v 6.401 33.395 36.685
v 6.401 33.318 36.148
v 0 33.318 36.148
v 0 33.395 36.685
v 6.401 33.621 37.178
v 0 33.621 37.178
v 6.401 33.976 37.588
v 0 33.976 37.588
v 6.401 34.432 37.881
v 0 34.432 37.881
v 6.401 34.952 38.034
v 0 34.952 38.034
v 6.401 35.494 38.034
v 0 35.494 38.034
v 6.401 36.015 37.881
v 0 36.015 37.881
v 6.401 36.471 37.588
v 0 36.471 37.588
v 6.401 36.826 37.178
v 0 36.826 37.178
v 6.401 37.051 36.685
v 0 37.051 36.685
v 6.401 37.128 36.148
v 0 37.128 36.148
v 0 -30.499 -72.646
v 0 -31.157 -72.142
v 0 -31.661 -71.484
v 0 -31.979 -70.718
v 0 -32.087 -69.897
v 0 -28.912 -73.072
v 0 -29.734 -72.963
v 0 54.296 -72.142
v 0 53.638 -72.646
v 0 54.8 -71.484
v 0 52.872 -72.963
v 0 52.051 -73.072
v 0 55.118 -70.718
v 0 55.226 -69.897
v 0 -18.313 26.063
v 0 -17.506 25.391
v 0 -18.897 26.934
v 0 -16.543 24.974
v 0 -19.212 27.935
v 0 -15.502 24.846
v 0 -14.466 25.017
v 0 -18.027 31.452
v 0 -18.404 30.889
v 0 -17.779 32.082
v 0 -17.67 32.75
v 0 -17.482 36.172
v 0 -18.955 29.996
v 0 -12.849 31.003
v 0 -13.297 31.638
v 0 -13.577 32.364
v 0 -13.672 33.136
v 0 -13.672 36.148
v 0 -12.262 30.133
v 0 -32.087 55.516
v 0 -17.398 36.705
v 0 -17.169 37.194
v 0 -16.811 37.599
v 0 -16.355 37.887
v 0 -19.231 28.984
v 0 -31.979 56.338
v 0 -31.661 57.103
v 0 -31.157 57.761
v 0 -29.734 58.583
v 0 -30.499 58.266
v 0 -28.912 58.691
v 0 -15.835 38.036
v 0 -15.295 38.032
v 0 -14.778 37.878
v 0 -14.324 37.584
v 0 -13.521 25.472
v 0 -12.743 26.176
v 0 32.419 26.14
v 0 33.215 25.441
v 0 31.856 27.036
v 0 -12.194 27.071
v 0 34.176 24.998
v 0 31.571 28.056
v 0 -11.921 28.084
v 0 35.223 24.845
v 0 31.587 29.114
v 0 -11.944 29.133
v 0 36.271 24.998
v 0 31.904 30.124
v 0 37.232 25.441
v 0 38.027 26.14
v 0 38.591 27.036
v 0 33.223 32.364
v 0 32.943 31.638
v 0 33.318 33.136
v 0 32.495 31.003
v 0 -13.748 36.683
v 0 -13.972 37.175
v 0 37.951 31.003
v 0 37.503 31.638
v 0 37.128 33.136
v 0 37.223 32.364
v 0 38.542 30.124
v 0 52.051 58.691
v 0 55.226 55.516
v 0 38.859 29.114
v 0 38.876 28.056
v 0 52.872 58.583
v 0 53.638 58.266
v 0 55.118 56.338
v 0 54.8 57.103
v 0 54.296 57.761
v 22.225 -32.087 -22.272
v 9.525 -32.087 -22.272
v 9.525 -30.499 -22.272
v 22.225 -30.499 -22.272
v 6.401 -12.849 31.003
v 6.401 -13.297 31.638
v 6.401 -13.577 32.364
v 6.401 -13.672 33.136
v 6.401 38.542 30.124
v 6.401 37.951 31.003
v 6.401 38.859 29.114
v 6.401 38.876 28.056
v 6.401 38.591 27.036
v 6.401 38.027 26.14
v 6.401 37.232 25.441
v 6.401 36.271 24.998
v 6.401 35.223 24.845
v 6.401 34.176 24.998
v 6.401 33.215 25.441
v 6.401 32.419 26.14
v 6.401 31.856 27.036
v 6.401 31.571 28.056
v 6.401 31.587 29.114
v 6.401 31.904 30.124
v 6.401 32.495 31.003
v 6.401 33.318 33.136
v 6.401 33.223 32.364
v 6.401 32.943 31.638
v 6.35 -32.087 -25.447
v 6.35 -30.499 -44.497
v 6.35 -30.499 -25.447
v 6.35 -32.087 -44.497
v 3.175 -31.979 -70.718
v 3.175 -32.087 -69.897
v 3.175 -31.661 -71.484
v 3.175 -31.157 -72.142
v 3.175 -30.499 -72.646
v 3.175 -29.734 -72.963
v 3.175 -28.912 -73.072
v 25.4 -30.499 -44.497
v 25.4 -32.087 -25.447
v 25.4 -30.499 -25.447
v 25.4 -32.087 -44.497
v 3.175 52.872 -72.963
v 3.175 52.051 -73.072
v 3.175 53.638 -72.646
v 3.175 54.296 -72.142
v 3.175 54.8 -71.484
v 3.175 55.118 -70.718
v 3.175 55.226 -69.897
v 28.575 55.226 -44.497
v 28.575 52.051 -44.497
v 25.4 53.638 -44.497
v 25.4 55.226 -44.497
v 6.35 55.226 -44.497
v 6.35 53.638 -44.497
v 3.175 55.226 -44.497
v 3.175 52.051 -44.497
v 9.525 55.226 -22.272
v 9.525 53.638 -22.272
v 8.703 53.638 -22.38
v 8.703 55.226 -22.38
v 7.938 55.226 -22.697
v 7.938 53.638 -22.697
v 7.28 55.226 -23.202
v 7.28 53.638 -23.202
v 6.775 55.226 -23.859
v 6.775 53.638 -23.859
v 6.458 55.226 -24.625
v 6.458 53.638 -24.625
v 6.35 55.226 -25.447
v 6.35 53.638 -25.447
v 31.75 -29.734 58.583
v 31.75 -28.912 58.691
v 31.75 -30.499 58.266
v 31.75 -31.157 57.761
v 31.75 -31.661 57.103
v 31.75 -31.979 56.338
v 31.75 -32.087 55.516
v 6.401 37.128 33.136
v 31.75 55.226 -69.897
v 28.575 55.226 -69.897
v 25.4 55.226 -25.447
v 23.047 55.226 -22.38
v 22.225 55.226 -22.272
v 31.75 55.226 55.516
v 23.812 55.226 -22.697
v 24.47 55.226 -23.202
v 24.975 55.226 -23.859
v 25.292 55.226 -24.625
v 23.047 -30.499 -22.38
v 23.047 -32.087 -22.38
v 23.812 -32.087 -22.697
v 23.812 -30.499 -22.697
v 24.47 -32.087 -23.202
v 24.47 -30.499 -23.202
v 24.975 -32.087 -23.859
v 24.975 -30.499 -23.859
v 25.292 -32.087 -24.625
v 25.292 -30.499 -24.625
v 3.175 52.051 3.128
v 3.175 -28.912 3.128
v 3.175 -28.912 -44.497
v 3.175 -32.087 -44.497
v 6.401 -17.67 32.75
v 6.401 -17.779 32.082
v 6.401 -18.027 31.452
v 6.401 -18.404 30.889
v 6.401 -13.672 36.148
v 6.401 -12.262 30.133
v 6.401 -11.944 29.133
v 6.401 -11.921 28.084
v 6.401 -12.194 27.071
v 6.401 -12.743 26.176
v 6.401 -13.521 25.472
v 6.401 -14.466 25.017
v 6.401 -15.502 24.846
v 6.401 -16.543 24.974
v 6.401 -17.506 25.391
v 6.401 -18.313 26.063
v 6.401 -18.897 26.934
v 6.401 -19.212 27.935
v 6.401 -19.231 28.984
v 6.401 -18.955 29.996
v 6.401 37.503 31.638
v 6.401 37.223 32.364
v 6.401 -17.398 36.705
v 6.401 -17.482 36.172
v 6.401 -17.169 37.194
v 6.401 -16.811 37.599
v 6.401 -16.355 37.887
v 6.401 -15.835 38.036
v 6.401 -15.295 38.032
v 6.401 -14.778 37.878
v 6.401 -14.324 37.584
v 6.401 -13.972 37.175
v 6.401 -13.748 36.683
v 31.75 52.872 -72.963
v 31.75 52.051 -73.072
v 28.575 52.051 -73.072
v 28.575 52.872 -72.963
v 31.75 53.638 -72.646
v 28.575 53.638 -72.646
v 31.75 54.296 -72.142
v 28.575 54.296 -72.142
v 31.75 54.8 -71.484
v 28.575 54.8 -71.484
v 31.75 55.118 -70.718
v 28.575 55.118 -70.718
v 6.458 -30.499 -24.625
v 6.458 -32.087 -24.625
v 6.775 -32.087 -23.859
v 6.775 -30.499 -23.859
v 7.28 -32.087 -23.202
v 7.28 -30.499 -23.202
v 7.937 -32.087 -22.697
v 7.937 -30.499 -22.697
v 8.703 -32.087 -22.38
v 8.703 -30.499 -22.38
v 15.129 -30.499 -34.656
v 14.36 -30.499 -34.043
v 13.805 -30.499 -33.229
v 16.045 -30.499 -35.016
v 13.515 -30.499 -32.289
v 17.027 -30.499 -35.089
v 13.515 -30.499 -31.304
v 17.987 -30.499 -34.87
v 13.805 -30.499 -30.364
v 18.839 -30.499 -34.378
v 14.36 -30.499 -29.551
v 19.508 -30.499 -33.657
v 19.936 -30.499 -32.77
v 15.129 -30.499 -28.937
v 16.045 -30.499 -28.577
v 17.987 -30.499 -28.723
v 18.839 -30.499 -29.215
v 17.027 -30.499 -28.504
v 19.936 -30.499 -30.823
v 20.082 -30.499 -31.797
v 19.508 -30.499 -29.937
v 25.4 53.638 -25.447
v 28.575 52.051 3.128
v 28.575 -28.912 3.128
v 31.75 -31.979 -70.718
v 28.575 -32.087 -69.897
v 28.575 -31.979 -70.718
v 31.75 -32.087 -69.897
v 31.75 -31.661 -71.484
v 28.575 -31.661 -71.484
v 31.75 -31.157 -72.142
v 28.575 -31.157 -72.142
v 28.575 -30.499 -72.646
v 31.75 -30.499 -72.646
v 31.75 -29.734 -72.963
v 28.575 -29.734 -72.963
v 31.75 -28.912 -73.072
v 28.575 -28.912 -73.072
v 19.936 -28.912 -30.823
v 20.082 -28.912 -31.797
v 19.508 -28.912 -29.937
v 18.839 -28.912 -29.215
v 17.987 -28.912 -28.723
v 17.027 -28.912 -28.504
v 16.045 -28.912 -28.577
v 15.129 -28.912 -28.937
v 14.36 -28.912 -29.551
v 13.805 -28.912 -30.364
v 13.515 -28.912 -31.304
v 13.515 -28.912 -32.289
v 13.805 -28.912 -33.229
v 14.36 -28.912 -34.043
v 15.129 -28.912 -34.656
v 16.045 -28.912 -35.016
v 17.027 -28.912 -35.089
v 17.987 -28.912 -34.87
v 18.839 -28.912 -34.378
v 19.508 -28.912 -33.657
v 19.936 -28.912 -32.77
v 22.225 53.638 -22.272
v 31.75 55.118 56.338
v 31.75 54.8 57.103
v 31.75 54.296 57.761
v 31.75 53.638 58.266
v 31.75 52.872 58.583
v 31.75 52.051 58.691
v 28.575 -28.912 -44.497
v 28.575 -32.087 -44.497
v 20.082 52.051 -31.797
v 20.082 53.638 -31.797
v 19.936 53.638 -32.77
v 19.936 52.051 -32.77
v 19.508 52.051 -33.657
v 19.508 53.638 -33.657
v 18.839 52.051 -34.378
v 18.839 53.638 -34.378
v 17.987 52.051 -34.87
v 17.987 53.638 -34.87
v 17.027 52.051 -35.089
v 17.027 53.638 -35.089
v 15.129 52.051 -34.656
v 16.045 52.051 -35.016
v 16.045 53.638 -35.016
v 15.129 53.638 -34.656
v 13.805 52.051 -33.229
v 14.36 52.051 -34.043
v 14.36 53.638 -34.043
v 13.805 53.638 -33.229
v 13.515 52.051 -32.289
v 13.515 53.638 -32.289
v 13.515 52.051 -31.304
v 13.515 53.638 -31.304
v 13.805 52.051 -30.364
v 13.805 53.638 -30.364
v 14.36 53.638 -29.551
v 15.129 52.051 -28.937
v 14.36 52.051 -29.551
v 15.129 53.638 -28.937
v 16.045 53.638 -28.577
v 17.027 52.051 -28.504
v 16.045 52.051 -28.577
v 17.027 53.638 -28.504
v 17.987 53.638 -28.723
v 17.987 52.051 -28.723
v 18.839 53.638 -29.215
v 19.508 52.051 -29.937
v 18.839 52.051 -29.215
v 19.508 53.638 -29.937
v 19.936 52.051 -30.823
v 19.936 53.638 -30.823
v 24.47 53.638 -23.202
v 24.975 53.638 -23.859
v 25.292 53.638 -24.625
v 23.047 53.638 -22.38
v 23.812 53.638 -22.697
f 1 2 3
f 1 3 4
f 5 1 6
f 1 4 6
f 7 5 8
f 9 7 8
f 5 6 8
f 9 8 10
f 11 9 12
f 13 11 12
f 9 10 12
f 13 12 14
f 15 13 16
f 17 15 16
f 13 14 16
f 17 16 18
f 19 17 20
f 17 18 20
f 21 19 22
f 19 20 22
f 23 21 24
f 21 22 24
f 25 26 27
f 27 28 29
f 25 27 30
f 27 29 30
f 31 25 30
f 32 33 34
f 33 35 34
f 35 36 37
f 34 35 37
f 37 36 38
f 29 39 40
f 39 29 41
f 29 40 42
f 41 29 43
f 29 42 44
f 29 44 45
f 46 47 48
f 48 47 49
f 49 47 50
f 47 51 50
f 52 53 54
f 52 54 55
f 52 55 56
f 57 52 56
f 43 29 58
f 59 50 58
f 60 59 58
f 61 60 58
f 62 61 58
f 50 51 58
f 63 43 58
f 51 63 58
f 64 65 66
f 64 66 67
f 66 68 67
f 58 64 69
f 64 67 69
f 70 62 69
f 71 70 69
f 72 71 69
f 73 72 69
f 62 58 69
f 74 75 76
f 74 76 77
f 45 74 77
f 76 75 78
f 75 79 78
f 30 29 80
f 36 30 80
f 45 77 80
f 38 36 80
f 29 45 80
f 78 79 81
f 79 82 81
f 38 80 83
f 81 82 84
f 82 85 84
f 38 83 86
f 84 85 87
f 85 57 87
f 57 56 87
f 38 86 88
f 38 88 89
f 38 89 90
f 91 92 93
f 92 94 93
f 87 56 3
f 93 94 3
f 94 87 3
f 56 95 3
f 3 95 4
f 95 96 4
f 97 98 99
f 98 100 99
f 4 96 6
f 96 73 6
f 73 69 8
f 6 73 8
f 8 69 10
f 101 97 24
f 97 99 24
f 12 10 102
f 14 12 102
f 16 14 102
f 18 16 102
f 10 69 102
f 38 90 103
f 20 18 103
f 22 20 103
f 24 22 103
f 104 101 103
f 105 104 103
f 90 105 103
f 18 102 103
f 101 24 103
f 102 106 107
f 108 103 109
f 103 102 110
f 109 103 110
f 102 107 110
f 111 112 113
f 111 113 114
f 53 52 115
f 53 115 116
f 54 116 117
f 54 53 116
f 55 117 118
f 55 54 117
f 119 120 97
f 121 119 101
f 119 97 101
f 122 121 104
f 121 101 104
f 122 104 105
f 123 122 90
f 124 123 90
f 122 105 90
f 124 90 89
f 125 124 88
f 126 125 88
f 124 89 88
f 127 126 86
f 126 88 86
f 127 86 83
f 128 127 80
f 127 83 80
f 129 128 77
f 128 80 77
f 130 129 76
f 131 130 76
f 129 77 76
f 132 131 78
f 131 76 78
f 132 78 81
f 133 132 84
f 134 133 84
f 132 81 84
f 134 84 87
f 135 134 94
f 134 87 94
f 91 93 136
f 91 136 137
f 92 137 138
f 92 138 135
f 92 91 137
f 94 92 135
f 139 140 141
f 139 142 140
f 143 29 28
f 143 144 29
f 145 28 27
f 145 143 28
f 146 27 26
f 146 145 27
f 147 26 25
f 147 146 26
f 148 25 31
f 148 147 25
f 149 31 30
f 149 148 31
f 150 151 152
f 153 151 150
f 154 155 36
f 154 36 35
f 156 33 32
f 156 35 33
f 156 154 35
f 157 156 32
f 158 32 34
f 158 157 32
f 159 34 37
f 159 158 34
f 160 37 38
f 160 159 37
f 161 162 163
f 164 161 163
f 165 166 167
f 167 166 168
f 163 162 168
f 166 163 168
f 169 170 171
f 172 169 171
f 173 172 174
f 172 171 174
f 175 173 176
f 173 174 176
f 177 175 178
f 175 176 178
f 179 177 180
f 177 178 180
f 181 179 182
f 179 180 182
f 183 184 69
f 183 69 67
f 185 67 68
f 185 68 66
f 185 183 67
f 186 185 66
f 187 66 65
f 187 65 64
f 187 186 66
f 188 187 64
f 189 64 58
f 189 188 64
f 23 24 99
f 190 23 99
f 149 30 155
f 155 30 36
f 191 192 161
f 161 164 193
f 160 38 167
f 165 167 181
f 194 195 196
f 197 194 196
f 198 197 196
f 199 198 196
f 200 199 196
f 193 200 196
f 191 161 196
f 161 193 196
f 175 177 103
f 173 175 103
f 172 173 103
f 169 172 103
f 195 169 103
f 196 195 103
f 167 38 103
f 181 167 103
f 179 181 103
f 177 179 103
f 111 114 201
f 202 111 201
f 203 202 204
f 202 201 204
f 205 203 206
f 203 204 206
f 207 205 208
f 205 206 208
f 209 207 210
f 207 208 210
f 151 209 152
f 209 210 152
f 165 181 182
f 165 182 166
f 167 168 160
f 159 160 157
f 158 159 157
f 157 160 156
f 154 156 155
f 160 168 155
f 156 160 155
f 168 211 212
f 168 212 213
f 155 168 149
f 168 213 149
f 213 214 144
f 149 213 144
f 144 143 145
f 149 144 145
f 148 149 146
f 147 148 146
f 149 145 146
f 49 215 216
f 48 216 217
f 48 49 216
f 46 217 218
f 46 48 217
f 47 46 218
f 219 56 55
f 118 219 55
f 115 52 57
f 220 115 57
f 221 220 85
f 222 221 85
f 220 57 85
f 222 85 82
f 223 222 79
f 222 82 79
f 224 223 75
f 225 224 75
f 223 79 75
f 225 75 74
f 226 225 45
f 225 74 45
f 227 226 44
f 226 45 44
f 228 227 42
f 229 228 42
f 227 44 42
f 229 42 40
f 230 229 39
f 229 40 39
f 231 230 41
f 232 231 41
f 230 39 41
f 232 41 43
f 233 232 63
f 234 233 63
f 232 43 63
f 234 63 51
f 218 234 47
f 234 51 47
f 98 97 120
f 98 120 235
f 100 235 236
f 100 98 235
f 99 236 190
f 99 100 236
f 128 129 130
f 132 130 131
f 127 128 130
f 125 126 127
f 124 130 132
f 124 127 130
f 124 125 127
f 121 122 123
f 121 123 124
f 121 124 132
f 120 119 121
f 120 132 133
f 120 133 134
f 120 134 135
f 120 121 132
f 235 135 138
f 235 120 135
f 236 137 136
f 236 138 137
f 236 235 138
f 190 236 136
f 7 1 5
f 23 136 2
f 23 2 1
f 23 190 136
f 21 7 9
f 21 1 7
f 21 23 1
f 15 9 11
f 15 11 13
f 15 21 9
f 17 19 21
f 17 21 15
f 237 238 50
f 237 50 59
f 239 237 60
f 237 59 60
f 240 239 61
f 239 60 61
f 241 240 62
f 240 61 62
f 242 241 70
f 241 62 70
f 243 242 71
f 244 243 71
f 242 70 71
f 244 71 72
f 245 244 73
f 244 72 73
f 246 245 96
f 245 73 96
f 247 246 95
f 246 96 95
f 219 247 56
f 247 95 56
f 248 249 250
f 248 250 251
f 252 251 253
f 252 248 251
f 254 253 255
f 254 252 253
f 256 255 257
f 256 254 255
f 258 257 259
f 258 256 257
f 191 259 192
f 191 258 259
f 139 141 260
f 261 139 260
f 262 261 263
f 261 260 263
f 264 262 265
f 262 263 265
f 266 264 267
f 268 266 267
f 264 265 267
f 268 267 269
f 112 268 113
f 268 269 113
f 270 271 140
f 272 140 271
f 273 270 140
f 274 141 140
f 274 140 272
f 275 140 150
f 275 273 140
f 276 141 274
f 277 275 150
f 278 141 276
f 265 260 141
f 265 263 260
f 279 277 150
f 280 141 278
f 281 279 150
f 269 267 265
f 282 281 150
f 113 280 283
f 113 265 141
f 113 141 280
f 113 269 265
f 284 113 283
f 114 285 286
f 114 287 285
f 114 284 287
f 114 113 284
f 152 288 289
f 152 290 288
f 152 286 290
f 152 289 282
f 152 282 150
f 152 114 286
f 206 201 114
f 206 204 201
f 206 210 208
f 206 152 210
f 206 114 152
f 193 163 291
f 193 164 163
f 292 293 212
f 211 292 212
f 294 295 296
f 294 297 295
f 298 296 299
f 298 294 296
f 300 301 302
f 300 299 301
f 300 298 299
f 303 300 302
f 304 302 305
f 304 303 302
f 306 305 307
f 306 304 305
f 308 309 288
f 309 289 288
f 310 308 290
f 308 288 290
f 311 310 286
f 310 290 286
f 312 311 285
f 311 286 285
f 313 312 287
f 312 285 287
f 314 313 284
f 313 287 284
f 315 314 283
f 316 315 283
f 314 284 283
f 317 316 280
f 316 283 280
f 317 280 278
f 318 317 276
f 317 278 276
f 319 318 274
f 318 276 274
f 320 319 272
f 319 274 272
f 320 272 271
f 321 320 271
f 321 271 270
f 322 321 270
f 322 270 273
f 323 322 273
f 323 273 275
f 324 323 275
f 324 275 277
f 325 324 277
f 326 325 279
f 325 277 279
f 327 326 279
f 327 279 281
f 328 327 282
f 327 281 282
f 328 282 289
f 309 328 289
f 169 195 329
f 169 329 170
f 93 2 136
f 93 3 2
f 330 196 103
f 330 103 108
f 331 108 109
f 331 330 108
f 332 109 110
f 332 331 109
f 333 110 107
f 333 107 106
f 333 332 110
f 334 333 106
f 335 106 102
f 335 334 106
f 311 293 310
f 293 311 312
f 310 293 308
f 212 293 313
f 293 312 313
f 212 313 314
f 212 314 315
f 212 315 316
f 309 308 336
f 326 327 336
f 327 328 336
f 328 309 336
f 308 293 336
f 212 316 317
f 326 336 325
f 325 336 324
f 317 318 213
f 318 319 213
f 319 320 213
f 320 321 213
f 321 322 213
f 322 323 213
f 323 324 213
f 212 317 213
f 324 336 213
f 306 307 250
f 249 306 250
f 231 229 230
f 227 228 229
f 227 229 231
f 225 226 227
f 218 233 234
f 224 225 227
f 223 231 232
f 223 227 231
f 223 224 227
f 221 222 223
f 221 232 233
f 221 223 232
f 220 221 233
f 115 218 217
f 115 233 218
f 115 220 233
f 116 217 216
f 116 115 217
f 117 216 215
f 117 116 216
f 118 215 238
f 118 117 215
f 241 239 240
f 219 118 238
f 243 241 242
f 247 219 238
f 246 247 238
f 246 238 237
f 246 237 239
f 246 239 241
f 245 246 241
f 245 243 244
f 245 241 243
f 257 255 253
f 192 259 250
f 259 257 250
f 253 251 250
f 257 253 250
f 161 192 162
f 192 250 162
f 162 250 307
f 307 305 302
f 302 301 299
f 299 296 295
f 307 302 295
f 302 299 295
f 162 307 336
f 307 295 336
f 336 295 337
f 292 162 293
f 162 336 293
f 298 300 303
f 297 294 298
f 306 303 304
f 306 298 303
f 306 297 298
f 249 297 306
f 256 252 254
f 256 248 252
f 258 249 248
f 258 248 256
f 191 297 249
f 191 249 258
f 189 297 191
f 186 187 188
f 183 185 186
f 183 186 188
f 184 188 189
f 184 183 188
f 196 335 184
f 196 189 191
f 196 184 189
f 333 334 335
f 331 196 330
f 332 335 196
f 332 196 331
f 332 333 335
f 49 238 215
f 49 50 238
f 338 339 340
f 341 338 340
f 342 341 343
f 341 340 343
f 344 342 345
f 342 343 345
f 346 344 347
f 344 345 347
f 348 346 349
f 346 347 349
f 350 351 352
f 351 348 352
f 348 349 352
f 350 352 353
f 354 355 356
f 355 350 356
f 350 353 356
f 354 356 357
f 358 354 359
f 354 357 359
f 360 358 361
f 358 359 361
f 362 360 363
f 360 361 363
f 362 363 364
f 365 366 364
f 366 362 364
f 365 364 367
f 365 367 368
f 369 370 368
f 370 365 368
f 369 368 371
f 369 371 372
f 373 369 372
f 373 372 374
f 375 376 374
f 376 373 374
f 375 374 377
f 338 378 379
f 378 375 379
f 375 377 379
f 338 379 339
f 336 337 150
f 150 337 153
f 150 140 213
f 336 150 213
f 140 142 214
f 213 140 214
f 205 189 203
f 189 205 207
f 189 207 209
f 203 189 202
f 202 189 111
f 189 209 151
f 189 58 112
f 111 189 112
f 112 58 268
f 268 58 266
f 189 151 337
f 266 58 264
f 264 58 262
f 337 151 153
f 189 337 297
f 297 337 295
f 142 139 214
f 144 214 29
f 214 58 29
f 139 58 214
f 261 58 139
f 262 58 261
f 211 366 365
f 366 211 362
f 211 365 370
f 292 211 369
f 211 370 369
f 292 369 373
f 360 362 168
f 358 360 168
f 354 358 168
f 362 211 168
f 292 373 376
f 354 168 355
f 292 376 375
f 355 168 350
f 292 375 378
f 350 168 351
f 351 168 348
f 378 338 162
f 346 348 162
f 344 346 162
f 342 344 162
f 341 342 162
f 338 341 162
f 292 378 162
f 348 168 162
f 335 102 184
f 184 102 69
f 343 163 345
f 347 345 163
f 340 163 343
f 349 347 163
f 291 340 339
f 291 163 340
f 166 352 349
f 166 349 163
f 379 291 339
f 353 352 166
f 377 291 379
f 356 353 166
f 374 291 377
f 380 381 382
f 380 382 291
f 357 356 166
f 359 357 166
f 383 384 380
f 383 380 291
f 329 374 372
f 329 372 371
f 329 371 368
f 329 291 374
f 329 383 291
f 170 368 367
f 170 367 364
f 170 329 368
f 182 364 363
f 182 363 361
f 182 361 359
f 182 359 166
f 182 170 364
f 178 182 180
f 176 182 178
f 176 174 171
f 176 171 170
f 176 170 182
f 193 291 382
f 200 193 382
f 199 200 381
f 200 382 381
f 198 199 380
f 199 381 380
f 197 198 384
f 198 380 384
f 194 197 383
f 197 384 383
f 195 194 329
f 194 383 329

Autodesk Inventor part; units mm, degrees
ref_plane "YZ Plane" through (0, 0, 0) normal (1, 0, 0) x (0, 1, 0)
ref_plane "XZ Plane" through (0, 0, 0) normal (0, 1, 0) x (-1, 0, 0)
ref_plane "XY Plane" through (0, 0, 0) normal (0, 0, 1) x (1, 0, 0)
sketch "Sketch1" plane through (0, 0, 0) normal (1, 0, 0) x (0, 1, 0)
  line L0 (55.2257, 58.6909) -> (-32.0868, 58.6909)
  line L1 (-32.0868, 58.6909) -> (-32.0868, -73.0716)
  line L2 (-32.0868, -73.0716) -> (55.2257, -73.0716)
  line L3 (55.2257, -73.0716) -> (55.2257, 58.6909)
  point P0 (0, 0)
  dimension "d0" = 131.7625
  dimension "d1" = 87.3125
extrude "Extrusion1" add sketch "Sketch1" along normal blind 31.75
sketch "Sketch2" plane through (0, -32.0868, -73.0716) normal (0, -1, 0) x (1, 0, 0)
  line L0 (31.75, 131.7625) -> (31.75, 0) projected
  line L1 (0, 131.7625) -> (0, 0) projected
  line L2 (28.575, 28.575) -> (3.175, 28.575)
  line L3 (3.175, 28.575) -> (3.175, 0)
  line L4 (3.175, 0) -> (28.575, 0)
  line L5 (28.575, 0) -> (28.575, 28.575)
  point P0 (0, 73.0716)
  point P1 (31.75, 28.575)
  dimension "d7" = 3.175
  dimension "d8" = 3.175
  dimension "d9" = 28.575
extrude "Extrusion2" cut sketch "Sketch2" against normal blind 87.3125
sketch "Sketch3" plane through (28.575, -32.0868, -44.4966) normal (0, 0, -1) x (-1, 0, 0)
  line L0 (0, 0) -> (0, 87.3125) projected
  line L1 (25.4, 0) -> (25.4, 87.3125) projected
  line L2 (0, 3.175) -> (25.4, 3.175)
  line L3 (25.4, 3.175) -> (25.4, 84.1375)
  line L4 (25.4, 84.1375) -> (0, 84.1375)
  line L5 (0, 84.1375) -> (0, 3.175)
  line L6 (0, 87.3125) -> (25.4, 87.3125) projected
  line L7 (25.4, 0) -> (0, 0) projected
  point P0 (28.575, 32.0868)
  point P1 (12.7, 84.1375)
  point P2 (12.7, 3.175)
  point P3 (0, 84.1375)
  point P4 (25.4, 3.175)
  dimension "d10" = 3.175
  dimension "d11" = 3.175
extrude "Extrusion3" cut sketch "Sketch3" against normal blind 47.625 contours L0 L4 L1 L2
sketch "Sketch4" plane through (0, -32.0868, -73.0716) normal (0, -1, 0) x (1, 0, 0)
  line L0 (3.175, 28.575) -> (28.575, 28.575) projected
  line L1 (25.4, 28.575) -> (6.35, 28.575)
  line L2 (6.35, 28.575) -> (6.35, 50.8)
  line L3 (6.35, 50.8) -> (25.4, 50.8)
  line L4 (25.4, 50.8) -> (25.4, 28.575)
  line L5 (31.75, 131.7625) -> (31.75, 0) projected
  circle A0 centre (16.7802, 41.275) radius 3.302
  point P0 (0, 73.0716)
  point P1 (15.875, 50.8)
  point P2 (15.875, 28.575)
  point P3 (25.4, 39.6875)
  point P4 (6.35, 28.575)
  dimension "d14" = 22.225
  dimension "d15" = 19.05
  dimension "d16" = 6.35
  dimension "d17" = 6.604
  dimension "d18" = 12.7
extrude "Extrusion4" cut sketch "Sketch4" against normal blind 1.5875
sketch "Sketch6" plane through (0, -30.4993, -73.0716) normal (0, -1, 0) x (1, 0, 0)
  circle A0 centre (16.7802, 41.275) radius 3.302 projected
  circle A1 centre (16.7802, 41.275) radius 3.302
  point P0 (0, 73.0716)
extrude "Extrusion5" cut sketch "Sketch6" along normal mid plane 3.175
ref_plane "Work Plane2" through (0, 11.5695, -73.0716) normal (0, -1, 0) x (1, 0, 0)
mirror "Mirror1" about plane through (0, 11.5695, -73.0716) normal (0, -1, 0) of "Extrusion4"
mirror "Mirror2" about plane through (0, 11.5695, -73.0716) normal (0, -1, 0) of "Extrusion5"
fillet "Fillet1" radius 3.175 4 edges at (30.1625, -32.0868, -73.0716) (1.5875, -32.0868, -73.0716) (30.1625, 55.2257, -73.0716) (1.5875, 55.2257, -73.0716)
fillet "Fillet2" radius 3.175 2 edges at (15.875, -32.0868, 58.6909) (15.875, 55.2257, 58.6909)
fillet "Fillet3" radius 3.175 4 edges at (6.35, -31.293, -22.2716) (25.4, -31.293, -22.2716) (25.4, 54.432, -22.2716) (6.35, 54.432, -22.2716)
sketch "Sketch8" plane through (0, 0, 0) normal (-1, 0, 0) x (0, 0, 1)
  line L0 (-69.8966, 55.2257) -> (55.5159, 55.2257) projected
  line L1 (-73.0716, -28.9118) -> (-73.0716, 52.0507) projected
  arc A0 (31.0026, -12.8486) -> (30.8894, -18.4035) centre (28.5284, -15.5768) ccw
  arc A1 (36.1718, -17.4816) -> (36.1484, -13.6718) centre (36.1484, -15.5768) ccw
  line L2 (36.1484, -13.6718) -> (33.1356, -13.6718)
  line L3 (36.1718, -17.4816) -> (32.75, -17.6702)
  arc A2 (31.0026, -12.8486) -> (33.1356, -13.6718) centre (33.1356, -10.4968) ccw
  arc A3 (32.75, -17.6702) -> (30.8894, -18.4035) centre (32.9247, -20.8403) ccw
  line L4 (55.5159, -32.0868) -> (-69.8966, -32.0868) projected
  arc A4 (31.0026, 37.9514) -> (31.0026, 32.4951) centre (28.5284, 35.2232) ccw
  arc A5 (36.1484, 33.3182) -> (36.1484, 37.1282) centre (36.1484, 35.2232) ccw
  line L5 (36.1484, 37.1282) -> (33.1356, 37.1282)
  line L6 (36.1484, 33.3182) -> (33.1356, 33.3182)
  arc A6 (31.0026, 37.9514) -> (33.1356, 37.1282) centre (33.1356, 40.3032) ccw
  arc A7 (33.1356, 33.3182) -> (31.0026, 32.4951) centre (33.1356, 30.1432) ccw
  point P0 (0, 0)
  point P1 (31.6805, -13.6718)
  point P2 (31.5103, -17.7385)
  point P3 (31.8314, 36.8525)
  point P4 (31.2779, 32.7727)
  point P5 (31.6805, 37.1282)
  point P6 (31.6805, 33.3182)
  dimension "d57" = 3.81
  dimension "d58" = 7.366
  dimension "d59" = 3.175
  dimension "d60" = 101.6
  dimension "d61" = 109.22
  dimension "d63" = 0
  dimension "d77" = 101.6
  dimension "d78" = 109.22
  dimension "d79" = 50.8
  dimension "d80" = 20.0025
  dimension "d81" = 3.81
  dimension "d82" = 7.366
  dimension "d83" = 3.175
extrude "Extrusion7" cut sketch "Sketch8" against normal blind 6.4008
properties part number "cDAQ_Chassis_LowPolyPlaceholder"
